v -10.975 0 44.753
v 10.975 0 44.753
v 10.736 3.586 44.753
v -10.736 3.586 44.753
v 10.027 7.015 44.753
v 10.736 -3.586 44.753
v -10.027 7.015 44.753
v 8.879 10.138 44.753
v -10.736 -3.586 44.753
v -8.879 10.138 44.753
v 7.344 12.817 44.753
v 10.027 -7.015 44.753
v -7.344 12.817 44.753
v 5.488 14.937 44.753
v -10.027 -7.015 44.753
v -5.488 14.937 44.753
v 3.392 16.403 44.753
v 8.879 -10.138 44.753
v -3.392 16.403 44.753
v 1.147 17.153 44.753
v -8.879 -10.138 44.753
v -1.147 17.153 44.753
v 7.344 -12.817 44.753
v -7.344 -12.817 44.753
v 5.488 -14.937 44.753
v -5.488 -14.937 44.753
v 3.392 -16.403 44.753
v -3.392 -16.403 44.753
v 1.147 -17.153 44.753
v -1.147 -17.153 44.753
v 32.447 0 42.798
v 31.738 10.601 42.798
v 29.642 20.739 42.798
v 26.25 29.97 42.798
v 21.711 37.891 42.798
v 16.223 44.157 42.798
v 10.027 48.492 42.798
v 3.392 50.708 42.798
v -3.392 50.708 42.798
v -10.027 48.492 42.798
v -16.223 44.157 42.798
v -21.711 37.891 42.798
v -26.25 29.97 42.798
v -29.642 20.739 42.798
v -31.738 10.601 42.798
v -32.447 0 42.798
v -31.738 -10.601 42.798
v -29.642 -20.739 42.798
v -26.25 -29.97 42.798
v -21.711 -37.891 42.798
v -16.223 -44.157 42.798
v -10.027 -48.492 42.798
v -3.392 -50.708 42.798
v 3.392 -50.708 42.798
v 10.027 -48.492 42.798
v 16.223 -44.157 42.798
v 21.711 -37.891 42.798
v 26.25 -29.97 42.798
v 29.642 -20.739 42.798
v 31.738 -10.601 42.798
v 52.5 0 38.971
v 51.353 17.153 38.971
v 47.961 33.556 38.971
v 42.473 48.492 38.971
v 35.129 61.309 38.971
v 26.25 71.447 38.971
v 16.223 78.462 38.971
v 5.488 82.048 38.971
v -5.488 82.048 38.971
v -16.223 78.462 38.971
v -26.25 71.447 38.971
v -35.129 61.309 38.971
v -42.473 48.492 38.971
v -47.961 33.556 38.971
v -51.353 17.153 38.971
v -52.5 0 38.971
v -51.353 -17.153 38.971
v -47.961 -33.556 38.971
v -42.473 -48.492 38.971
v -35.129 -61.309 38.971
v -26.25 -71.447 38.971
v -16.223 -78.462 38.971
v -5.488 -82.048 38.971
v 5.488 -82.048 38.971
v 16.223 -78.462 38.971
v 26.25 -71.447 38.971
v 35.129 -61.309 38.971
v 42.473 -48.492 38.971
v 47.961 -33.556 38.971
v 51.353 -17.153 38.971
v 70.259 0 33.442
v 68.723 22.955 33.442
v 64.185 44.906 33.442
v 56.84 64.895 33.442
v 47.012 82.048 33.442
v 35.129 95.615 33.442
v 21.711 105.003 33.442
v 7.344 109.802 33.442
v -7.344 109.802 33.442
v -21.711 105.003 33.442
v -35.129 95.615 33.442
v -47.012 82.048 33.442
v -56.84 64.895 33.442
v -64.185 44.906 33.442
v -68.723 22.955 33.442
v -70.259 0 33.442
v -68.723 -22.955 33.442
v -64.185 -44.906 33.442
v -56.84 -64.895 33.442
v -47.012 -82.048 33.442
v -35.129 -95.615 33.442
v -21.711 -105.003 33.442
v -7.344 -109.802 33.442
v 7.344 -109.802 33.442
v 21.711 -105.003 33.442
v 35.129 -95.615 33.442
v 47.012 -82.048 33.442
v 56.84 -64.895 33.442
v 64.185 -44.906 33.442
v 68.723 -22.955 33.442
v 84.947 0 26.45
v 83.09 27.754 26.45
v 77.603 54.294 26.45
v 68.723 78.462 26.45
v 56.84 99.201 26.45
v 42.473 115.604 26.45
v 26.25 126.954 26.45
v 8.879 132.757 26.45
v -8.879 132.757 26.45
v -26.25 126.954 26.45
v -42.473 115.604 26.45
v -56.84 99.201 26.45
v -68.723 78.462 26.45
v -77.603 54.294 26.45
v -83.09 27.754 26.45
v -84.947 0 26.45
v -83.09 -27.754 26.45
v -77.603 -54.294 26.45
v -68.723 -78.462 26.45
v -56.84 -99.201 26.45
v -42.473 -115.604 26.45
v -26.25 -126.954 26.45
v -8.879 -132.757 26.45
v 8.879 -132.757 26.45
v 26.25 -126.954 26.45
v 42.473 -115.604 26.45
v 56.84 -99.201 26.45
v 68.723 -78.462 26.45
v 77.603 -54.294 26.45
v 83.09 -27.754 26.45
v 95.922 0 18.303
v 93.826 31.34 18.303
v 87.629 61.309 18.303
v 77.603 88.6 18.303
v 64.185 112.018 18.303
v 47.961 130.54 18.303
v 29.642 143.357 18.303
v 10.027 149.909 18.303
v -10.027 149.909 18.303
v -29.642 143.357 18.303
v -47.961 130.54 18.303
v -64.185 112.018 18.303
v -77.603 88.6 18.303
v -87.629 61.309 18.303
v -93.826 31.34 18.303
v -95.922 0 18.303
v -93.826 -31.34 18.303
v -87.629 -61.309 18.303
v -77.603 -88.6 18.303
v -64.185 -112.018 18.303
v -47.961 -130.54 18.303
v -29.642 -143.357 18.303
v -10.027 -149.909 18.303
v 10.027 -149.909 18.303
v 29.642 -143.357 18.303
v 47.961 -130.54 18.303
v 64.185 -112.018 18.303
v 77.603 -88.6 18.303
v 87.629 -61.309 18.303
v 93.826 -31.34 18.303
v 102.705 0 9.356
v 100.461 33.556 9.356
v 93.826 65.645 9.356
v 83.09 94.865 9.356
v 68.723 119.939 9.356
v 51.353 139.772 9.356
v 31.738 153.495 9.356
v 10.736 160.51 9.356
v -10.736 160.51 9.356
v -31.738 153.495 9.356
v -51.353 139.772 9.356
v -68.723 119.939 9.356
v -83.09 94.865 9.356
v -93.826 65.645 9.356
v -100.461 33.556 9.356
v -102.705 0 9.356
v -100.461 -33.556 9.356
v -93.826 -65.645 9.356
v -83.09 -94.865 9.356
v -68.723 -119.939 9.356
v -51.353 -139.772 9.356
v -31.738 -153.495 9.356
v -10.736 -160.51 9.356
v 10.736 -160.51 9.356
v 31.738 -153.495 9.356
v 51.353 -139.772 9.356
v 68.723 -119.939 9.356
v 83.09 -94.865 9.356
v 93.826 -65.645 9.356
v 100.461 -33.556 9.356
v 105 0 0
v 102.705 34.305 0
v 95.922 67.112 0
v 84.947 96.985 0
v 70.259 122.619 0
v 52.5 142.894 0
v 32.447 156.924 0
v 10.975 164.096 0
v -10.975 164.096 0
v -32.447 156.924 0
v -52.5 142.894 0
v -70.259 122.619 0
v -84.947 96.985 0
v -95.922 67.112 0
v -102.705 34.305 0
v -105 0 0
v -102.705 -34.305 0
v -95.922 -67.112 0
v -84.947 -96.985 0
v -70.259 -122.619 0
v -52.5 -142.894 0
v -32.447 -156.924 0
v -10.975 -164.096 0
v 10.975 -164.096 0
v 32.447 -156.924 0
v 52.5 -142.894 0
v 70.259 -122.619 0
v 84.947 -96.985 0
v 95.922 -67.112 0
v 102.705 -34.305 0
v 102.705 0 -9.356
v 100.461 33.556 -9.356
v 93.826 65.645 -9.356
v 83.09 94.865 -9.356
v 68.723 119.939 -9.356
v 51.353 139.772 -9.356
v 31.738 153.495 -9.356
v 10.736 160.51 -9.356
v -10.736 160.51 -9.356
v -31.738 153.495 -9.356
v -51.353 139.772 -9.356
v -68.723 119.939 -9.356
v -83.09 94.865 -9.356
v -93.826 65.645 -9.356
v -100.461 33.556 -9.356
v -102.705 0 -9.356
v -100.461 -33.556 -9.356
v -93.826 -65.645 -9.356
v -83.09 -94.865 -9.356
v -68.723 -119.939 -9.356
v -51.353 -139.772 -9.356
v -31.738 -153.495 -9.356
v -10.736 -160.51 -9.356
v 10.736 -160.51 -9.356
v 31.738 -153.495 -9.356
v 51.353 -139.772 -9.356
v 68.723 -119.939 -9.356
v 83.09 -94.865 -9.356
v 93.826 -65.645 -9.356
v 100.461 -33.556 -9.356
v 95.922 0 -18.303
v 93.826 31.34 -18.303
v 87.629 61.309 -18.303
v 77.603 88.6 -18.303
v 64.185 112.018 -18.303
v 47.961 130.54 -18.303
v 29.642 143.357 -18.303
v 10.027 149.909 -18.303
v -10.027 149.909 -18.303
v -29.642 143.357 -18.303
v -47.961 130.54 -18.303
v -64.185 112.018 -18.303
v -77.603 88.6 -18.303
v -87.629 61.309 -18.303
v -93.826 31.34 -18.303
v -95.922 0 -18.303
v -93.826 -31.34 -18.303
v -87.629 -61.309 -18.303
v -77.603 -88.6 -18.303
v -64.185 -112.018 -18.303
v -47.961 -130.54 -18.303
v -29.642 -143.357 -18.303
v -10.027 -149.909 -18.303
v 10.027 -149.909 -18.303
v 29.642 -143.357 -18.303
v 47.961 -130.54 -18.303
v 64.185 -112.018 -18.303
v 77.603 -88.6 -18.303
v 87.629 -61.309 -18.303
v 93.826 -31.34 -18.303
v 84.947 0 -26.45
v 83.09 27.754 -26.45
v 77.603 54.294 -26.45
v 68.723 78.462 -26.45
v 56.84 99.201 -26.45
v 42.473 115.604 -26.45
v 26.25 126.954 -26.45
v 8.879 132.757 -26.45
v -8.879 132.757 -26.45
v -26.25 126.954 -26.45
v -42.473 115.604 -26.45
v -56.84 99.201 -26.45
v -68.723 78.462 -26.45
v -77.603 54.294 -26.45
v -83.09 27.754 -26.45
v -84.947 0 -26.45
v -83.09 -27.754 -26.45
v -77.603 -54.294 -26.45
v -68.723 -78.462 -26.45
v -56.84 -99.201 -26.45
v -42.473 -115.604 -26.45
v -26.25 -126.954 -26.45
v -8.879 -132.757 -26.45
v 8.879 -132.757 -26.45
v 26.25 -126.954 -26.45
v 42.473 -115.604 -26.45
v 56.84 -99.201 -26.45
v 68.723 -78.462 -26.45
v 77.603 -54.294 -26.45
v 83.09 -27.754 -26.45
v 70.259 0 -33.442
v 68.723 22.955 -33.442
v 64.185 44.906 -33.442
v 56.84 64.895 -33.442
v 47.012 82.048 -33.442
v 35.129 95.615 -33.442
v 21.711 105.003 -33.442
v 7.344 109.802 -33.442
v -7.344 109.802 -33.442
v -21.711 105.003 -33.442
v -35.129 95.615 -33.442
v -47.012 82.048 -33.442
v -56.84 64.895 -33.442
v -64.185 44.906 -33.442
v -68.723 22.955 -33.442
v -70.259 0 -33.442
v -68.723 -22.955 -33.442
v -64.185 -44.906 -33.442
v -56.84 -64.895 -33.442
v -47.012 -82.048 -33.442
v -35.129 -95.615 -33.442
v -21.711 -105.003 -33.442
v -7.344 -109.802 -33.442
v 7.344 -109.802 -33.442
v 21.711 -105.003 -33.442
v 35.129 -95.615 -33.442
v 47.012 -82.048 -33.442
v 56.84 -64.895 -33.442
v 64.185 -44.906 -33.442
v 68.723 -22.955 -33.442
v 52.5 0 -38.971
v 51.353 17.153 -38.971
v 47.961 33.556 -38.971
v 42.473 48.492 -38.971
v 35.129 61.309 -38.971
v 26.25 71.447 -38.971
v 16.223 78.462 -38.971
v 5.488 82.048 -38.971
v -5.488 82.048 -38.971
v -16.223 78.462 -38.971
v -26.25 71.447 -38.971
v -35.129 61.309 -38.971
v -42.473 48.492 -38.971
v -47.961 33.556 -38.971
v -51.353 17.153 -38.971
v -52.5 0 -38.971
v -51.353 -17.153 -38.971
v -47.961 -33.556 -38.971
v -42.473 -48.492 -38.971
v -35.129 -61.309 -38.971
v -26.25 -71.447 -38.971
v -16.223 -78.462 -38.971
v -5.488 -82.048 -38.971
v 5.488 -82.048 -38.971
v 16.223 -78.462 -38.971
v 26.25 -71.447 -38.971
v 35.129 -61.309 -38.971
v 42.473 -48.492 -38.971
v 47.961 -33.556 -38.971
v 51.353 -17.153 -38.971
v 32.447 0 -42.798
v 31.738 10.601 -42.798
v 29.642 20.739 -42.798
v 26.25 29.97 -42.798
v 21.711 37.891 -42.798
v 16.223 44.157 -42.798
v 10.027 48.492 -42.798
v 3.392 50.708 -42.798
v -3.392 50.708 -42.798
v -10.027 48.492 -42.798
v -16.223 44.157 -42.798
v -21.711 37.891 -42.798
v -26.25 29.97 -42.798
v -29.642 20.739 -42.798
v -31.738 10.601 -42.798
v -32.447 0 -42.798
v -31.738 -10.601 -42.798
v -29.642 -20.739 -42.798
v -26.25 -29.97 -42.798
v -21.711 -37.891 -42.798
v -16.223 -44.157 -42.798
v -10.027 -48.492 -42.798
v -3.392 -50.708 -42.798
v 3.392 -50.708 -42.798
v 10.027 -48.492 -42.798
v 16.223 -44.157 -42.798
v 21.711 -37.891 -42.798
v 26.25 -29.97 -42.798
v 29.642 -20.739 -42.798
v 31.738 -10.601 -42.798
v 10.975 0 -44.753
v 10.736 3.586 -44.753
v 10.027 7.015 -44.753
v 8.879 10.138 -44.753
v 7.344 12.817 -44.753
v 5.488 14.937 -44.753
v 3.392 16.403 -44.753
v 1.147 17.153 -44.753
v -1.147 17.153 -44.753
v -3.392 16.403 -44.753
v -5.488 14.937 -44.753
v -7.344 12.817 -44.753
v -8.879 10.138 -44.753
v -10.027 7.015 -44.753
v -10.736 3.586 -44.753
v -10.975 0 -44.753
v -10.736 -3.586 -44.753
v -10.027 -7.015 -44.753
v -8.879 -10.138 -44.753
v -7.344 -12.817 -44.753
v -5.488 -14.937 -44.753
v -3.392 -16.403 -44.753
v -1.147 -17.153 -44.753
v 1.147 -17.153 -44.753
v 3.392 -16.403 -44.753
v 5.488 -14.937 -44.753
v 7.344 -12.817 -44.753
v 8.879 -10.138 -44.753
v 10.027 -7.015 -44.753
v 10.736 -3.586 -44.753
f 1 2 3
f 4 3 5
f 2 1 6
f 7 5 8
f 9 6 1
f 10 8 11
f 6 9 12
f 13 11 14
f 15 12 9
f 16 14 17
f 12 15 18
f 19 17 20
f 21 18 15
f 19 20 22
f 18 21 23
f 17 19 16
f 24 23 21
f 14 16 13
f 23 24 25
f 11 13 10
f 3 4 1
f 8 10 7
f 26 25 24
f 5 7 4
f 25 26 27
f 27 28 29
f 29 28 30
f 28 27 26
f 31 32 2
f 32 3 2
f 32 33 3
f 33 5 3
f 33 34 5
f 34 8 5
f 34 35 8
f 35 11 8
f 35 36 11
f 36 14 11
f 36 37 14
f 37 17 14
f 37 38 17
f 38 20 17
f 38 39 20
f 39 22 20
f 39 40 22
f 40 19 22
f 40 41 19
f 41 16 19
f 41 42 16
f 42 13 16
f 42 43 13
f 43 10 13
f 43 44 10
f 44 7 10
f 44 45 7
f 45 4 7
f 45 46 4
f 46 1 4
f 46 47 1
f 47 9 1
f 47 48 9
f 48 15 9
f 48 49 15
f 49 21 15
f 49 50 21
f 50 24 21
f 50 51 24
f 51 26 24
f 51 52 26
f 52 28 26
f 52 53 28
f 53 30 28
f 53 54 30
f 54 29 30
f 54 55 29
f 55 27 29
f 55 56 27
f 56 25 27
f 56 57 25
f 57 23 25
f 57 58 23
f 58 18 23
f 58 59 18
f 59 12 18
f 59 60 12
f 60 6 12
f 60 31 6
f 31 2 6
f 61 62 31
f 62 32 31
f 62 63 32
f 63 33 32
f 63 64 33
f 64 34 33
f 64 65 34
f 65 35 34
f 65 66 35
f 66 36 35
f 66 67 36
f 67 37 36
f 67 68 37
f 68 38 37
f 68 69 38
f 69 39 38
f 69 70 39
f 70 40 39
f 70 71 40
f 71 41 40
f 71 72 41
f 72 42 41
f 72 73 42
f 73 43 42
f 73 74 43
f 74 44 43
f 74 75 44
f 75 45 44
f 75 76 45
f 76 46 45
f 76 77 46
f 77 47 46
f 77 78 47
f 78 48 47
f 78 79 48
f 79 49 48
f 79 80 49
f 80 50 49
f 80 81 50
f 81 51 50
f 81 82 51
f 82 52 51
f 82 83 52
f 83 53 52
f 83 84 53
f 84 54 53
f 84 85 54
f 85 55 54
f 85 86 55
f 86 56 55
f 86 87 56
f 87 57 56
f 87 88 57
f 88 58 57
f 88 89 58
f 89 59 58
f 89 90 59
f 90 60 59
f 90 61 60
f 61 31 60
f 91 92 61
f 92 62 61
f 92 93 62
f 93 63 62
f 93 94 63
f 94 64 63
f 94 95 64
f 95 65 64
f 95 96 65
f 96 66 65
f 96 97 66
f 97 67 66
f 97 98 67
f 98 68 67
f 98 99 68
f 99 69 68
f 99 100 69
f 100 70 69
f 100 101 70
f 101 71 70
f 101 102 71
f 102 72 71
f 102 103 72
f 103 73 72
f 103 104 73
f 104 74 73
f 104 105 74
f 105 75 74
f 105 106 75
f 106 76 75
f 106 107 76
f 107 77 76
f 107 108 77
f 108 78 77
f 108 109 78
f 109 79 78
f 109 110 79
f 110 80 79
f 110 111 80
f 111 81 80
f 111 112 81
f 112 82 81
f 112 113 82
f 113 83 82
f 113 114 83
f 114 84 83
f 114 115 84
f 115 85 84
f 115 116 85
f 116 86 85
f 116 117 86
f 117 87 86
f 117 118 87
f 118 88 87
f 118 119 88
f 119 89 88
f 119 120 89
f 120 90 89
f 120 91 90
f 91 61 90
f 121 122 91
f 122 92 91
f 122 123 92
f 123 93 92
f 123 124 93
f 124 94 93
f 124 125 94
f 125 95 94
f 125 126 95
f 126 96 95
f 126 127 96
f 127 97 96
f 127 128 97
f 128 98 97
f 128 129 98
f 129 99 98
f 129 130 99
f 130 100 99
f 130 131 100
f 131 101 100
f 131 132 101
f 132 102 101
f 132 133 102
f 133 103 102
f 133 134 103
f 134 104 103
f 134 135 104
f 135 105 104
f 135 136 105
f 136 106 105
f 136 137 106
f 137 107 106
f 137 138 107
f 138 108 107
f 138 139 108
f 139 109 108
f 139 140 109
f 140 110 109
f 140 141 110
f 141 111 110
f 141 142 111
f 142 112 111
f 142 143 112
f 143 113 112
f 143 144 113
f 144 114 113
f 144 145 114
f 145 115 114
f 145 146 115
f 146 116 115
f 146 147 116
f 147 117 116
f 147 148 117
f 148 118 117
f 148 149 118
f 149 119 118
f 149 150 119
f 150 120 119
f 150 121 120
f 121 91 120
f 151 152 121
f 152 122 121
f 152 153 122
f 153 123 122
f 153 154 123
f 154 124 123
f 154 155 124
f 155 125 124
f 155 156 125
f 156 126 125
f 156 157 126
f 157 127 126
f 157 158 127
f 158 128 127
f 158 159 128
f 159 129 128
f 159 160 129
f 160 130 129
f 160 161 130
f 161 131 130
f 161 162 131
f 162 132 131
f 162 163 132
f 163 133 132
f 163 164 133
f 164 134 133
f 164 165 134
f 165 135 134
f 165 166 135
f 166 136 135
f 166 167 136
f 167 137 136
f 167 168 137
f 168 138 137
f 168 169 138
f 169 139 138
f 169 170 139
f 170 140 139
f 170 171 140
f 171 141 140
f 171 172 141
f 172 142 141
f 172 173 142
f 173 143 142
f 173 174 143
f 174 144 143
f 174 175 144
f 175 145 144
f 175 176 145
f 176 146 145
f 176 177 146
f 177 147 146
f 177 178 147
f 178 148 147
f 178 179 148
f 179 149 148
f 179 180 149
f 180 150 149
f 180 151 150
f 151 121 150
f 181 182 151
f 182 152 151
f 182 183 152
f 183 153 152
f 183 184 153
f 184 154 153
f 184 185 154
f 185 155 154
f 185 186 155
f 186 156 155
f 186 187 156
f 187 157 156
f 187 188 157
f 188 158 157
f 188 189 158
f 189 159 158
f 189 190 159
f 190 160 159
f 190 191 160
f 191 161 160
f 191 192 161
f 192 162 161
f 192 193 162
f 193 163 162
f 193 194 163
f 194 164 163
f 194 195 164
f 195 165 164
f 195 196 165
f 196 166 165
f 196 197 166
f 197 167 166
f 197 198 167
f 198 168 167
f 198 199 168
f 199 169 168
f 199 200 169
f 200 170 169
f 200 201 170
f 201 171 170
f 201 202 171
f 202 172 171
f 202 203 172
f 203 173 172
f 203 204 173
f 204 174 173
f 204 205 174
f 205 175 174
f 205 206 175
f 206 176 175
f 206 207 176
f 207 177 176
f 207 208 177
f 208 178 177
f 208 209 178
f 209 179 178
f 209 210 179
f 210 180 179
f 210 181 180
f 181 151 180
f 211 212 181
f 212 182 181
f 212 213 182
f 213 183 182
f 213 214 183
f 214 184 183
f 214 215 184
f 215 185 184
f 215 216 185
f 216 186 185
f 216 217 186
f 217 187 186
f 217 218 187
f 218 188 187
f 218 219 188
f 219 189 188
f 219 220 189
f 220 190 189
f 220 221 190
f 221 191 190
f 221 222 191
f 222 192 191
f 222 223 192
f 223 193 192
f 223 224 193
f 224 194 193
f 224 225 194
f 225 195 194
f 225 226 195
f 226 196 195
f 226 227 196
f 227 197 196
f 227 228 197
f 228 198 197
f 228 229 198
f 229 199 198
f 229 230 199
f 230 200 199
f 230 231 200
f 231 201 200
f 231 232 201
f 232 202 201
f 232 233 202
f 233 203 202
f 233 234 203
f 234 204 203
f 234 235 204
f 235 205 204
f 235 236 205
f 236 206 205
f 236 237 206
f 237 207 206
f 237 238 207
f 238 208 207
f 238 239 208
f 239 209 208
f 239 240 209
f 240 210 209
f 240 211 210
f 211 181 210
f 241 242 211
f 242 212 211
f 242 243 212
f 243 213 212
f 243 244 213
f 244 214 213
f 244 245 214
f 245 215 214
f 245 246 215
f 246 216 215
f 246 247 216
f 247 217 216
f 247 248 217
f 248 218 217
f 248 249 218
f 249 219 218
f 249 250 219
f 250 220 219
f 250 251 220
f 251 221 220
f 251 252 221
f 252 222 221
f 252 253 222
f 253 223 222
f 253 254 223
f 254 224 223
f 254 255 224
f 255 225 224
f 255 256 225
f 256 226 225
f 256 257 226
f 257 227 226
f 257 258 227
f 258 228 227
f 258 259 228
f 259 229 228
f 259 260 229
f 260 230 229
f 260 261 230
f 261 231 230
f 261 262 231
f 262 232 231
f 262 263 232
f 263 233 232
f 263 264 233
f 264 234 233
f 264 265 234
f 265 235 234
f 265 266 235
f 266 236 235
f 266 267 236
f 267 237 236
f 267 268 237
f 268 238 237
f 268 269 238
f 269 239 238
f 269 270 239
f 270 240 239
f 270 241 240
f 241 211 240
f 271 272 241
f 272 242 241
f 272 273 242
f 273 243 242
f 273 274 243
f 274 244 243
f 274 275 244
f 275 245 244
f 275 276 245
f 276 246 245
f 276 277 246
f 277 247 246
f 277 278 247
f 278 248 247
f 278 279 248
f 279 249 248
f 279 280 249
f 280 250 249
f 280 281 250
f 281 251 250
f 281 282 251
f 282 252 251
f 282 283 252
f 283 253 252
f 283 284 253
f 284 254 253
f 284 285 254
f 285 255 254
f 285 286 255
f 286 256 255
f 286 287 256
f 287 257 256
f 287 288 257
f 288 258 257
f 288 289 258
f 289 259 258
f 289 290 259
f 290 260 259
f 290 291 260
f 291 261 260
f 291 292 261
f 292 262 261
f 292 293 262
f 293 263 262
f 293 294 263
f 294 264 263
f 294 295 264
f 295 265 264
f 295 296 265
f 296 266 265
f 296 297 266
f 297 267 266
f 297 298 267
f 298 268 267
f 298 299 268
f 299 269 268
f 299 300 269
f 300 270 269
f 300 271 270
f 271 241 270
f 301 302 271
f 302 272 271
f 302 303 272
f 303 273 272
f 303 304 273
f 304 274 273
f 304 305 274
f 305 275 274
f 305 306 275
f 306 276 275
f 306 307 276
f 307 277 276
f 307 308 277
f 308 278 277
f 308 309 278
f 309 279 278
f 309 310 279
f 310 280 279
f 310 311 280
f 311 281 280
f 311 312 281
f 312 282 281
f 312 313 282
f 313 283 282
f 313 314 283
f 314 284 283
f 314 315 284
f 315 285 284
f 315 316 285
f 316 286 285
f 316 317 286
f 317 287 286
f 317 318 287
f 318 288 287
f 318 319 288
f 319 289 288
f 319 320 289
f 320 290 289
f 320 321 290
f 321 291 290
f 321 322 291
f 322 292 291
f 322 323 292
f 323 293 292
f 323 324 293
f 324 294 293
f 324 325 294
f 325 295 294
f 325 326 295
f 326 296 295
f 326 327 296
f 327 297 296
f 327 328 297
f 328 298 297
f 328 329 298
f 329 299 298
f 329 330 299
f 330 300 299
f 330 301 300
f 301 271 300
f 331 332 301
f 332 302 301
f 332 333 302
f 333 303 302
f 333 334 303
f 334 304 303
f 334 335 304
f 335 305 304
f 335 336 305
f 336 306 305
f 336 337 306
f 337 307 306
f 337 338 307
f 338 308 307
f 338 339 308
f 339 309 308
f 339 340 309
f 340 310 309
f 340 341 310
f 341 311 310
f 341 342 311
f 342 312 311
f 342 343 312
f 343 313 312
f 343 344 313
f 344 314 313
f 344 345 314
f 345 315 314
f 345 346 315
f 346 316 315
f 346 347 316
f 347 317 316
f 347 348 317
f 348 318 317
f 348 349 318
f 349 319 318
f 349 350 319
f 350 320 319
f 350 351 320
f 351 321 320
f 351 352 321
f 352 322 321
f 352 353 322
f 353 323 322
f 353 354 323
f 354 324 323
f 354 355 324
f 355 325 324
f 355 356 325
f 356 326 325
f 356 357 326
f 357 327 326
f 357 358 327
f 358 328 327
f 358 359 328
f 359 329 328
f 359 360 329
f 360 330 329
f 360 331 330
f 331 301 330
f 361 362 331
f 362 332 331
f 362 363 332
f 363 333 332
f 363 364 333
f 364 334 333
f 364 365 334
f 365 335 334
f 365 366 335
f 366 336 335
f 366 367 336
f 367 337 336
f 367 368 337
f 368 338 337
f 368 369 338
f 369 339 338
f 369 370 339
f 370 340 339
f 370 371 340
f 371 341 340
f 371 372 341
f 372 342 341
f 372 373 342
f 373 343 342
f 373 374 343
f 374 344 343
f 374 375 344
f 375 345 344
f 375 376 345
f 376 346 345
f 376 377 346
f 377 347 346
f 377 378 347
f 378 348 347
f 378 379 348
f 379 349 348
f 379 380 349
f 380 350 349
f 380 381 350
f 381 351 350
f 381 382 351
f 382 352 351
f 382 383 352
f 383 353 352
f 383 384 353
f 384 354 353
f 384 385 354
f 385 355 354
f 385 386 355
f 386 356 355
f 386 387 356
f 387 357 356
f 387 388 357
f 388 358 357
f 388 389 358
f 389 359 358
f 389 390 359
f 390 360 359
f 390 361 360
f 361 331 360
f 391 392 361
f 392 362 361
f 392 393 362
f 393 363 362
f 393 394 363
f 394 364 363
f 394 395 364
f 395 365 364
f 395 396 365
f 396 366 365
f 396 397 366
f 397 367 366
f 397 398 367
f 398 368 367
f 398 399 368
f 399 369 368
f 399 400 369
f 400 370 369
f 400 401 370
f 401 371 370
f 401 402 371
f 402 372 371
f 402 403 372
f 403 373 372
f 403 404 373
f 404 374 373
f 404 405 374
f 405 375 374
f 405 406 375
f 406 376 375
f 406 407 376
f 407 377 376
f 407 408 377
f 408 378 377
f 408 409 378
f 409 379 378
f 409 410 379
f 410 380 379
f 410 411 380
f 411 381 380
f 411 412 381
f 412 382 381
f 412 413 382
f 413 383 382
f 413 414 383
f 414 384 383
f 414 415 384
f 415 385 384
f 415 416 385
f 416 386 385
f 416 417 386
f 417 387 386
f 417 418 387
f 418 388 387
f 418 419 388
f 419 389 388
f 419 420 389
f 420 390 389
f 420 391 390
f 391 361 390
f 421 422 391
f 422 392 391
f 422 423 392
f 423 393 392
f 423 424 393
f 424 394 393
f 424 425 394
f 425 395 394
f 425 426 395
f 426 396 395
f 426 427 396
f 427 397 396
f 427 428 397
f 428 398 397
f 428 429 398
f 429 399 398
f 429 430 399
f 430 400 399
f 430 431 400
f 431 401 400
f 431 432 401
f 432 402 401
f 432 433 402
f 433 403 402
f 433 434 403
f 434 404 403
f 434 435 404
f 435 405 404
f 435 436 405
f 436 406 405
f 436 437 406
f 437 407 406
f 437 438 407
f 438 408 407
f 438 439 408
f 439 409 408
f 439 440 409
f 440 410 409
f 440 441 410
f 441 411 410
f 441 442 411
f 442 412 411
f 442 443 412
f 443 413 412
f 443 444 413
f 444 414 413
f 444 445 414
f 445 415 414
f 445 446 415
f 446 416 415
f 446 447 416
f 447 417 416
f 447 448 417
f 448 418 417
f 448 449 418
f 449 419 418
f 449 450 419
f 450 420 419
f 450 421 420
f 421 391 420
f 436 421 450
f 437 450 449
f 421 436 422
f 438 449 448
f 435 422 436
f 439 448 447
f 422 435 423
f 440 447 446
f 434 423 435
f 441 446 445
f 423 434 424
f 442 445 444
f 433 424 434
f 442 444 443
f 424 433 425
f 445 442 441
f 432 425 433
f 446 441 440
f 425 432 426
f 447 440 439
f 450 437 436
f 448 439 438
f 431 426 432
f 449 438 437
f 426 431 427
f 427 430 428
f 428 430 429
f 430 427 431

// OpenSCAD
// Generated by SolidPython 1.0.1 on 2020-07-29 00:46:47


scale(v = [7, 11, 3]) {
	sphere(r = 15);
}
/***********************************************
*********      SolidPython code:      **********
************************************************
 
# import packages: SolidPython
from solid import *
from solid.utils import *
from itertools import chain, combinations, permutations


class Resize:

    def __init__(self, scad_file):
        self.scad_file = scad_file
        #self.scad_file = import_scad(scad_file)
        # cone/cylinder param:
        self.r1 = 0
        self.r2 = 0
        self.h = 0
        # rectangular prism param:
        self.w = 0
        self.l = 0
        # ellipse param:
        self.r = 0

    # import OpenScad code (file name corresponds to shape)


    # classify shape + parameters
    def assign(self, param1, param2, param3):
        if self.scad_file == 'cone.scad':
            self.r1 = param1
            self.r2 = param2
            self.h = param3
        elif self.scad_file == 'cylinder.scad':
            self.r1 = param1
            self.r2 = param2
            self.h = param3
        elif self.scad_file == 'rectangularPrism.scad':
            self.h = param1
            self.l = param2
            self.w = param3
        else:
            self.r = param1
            self.h = param2

    # resize parameters
    def iterate(self):
        x = range(3, 20, 2)
        i = 1
        if self.scad_file == 'cone.scad':
            tempList = list(permutations(x, 2))
            for temp in tempList:
                param1 = temp[0]
                param2 = temp[1]
                filepath = 'produced_scad_files/' + 'cone' + str(param1) + '_' + str(param2) + '_' + '.scad'
                scad_render_to_file(cylinder(h=param1, r1=param2, r2=0), filepath)

        elif self.scad_file == 'cylinder.scad':
            tempList = list(permutations(x, 3))
            for temp in tempList:
                param1 = temp[0]
                param2 = temp[1]
                filepath = 'produced_scad_files/' + 'cylinder' + str(param1) + '_' + str(param2) + '_' + '.scad'
                scad_render_to_file(cylinder(h=param1, r1=param2, r2=param2), filepath)

        elif self.scad_file == 'rectangularPrism.scad':
            tempList = list(permutations(x, 3))
            for temp in tempList:
                param1 = temp[0]
                param2 = temp[1]
                param3 = temp[2]
                filepath = 'produced_scad_files/' + 'rectangularPrism' + str(param1) + '_' + str(param2) + '_' + str(
                    param3) + '.scad'
                scad_render_to_file(cube(size=(param1, param2, param3)), filepath)

        elif self.scad_file == 'ellipse.scad':
            tempList = list(permutations(x, 4))
            for temp in tempList:
                param1 = temp[0]
                param2 = temp[1]
                param3 = temp[2]
                param4 = temp[3]
                filepath = 'produced_scad_files/' + 'ellipse' + str(param1) + '_' + str(param2) + '_' + str(param3) + '_' + str(param4) + '.scad'
                scad_render_to_file(scale([param1, param2, param3])(sphere(r=param4)), filepath)

    def render_to_scadfile(self):
        scad_render_to_file(scad, 'example.scad') 
 
************************************************/
